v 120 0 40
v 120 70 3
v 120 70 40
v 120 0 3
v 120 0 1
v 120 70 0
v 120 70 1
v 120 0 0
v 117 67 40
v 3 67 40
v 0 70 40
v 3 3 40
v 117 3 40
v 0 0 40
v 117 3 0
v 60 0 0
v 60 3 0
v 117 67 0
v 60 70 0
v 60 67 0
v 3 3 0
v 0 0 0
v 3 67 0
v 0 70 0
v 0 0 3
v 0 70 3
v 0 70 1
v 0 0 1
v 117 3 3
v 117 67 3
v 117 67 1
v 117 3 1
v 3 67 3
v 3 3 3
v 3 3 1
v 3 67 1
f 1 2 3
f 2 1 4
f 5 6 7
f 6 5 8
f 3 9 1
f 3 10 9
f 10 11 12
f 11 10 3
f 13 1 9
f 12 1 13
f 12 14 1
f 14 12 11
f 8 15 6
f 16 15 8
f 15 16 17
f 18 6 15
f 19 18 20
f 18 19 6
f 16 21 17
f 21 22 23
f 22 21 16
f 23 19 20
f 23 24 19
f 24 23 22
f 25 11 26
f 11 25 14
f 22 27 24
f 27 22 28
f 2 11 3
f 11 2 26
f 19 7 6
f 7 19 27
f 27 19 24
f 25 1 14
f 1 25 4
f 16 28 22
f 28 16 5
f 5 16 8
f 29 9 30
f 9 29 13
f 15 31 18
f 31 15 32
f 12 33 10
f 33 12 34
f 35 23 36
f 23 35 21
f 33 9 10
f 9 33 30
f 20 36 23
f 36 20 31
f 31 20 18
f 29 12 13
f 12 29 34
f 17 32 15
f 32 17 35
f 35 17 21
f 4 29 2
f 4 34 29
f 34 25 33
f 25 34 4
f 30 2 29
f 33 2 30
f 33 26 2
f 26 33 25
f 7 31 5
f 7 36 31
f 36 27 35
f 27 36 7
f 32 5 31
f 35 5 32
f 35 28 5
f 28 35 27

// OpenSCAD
// Buffer tank for a mini horizontal gel-electrophoresis box. Open-top rectangular tank with a
// solid raised platform in the middle that divides the bottom into two buffer chambers. Each
// end wall gets a horizontal 2 mm hole along X at y = 0, z = 30 for the electrode wires.
//

Lx = 120;
Wy = 70;
H  = 40;
w  = 3;
fl = 3;

$fn = 64;

ilx = Lx - 2 * w;
iy  = Wy - 2 * w;
ih  = H - fl;

difference() {
    cube([Lx, Wy, H]);
    translate([w, w, fl]) cube([ilx, iy, ih]);     // inner cavity
    translate([w, w, 0]) cube([ilx, iy, fl]);      // floor
    cl = min(w, fl - 1);                           // clearance under the platform
    translate([0, w, fl - cl]) cube([Lx, Wy - 2 * w, cl]);  // left chamber floor
    translate([Lx - w, w, fl - cl]) cube([w, Wy - 2 * w, cl]);  // right chamber floor
    platform_t = fl - cl + 10;                     // platform top above inner floor
    translate([0, 0, fl - cl]) cube([Lx, Wy, cl]); // fill space below platform to keep it floating
    translate([(Lx - 60) / 2, 0, fl - cl]) cube([60, Wy, fl - cl]);  // platform X span, full width, at clearance height
    for (x = [-Lx / 2, Lx / 2])
        translate([x, -1, -1]) rotate([-90, 0, 0]) cylinder(h = Lx, d = 2);  // horizontal X holes in the end walls
}
